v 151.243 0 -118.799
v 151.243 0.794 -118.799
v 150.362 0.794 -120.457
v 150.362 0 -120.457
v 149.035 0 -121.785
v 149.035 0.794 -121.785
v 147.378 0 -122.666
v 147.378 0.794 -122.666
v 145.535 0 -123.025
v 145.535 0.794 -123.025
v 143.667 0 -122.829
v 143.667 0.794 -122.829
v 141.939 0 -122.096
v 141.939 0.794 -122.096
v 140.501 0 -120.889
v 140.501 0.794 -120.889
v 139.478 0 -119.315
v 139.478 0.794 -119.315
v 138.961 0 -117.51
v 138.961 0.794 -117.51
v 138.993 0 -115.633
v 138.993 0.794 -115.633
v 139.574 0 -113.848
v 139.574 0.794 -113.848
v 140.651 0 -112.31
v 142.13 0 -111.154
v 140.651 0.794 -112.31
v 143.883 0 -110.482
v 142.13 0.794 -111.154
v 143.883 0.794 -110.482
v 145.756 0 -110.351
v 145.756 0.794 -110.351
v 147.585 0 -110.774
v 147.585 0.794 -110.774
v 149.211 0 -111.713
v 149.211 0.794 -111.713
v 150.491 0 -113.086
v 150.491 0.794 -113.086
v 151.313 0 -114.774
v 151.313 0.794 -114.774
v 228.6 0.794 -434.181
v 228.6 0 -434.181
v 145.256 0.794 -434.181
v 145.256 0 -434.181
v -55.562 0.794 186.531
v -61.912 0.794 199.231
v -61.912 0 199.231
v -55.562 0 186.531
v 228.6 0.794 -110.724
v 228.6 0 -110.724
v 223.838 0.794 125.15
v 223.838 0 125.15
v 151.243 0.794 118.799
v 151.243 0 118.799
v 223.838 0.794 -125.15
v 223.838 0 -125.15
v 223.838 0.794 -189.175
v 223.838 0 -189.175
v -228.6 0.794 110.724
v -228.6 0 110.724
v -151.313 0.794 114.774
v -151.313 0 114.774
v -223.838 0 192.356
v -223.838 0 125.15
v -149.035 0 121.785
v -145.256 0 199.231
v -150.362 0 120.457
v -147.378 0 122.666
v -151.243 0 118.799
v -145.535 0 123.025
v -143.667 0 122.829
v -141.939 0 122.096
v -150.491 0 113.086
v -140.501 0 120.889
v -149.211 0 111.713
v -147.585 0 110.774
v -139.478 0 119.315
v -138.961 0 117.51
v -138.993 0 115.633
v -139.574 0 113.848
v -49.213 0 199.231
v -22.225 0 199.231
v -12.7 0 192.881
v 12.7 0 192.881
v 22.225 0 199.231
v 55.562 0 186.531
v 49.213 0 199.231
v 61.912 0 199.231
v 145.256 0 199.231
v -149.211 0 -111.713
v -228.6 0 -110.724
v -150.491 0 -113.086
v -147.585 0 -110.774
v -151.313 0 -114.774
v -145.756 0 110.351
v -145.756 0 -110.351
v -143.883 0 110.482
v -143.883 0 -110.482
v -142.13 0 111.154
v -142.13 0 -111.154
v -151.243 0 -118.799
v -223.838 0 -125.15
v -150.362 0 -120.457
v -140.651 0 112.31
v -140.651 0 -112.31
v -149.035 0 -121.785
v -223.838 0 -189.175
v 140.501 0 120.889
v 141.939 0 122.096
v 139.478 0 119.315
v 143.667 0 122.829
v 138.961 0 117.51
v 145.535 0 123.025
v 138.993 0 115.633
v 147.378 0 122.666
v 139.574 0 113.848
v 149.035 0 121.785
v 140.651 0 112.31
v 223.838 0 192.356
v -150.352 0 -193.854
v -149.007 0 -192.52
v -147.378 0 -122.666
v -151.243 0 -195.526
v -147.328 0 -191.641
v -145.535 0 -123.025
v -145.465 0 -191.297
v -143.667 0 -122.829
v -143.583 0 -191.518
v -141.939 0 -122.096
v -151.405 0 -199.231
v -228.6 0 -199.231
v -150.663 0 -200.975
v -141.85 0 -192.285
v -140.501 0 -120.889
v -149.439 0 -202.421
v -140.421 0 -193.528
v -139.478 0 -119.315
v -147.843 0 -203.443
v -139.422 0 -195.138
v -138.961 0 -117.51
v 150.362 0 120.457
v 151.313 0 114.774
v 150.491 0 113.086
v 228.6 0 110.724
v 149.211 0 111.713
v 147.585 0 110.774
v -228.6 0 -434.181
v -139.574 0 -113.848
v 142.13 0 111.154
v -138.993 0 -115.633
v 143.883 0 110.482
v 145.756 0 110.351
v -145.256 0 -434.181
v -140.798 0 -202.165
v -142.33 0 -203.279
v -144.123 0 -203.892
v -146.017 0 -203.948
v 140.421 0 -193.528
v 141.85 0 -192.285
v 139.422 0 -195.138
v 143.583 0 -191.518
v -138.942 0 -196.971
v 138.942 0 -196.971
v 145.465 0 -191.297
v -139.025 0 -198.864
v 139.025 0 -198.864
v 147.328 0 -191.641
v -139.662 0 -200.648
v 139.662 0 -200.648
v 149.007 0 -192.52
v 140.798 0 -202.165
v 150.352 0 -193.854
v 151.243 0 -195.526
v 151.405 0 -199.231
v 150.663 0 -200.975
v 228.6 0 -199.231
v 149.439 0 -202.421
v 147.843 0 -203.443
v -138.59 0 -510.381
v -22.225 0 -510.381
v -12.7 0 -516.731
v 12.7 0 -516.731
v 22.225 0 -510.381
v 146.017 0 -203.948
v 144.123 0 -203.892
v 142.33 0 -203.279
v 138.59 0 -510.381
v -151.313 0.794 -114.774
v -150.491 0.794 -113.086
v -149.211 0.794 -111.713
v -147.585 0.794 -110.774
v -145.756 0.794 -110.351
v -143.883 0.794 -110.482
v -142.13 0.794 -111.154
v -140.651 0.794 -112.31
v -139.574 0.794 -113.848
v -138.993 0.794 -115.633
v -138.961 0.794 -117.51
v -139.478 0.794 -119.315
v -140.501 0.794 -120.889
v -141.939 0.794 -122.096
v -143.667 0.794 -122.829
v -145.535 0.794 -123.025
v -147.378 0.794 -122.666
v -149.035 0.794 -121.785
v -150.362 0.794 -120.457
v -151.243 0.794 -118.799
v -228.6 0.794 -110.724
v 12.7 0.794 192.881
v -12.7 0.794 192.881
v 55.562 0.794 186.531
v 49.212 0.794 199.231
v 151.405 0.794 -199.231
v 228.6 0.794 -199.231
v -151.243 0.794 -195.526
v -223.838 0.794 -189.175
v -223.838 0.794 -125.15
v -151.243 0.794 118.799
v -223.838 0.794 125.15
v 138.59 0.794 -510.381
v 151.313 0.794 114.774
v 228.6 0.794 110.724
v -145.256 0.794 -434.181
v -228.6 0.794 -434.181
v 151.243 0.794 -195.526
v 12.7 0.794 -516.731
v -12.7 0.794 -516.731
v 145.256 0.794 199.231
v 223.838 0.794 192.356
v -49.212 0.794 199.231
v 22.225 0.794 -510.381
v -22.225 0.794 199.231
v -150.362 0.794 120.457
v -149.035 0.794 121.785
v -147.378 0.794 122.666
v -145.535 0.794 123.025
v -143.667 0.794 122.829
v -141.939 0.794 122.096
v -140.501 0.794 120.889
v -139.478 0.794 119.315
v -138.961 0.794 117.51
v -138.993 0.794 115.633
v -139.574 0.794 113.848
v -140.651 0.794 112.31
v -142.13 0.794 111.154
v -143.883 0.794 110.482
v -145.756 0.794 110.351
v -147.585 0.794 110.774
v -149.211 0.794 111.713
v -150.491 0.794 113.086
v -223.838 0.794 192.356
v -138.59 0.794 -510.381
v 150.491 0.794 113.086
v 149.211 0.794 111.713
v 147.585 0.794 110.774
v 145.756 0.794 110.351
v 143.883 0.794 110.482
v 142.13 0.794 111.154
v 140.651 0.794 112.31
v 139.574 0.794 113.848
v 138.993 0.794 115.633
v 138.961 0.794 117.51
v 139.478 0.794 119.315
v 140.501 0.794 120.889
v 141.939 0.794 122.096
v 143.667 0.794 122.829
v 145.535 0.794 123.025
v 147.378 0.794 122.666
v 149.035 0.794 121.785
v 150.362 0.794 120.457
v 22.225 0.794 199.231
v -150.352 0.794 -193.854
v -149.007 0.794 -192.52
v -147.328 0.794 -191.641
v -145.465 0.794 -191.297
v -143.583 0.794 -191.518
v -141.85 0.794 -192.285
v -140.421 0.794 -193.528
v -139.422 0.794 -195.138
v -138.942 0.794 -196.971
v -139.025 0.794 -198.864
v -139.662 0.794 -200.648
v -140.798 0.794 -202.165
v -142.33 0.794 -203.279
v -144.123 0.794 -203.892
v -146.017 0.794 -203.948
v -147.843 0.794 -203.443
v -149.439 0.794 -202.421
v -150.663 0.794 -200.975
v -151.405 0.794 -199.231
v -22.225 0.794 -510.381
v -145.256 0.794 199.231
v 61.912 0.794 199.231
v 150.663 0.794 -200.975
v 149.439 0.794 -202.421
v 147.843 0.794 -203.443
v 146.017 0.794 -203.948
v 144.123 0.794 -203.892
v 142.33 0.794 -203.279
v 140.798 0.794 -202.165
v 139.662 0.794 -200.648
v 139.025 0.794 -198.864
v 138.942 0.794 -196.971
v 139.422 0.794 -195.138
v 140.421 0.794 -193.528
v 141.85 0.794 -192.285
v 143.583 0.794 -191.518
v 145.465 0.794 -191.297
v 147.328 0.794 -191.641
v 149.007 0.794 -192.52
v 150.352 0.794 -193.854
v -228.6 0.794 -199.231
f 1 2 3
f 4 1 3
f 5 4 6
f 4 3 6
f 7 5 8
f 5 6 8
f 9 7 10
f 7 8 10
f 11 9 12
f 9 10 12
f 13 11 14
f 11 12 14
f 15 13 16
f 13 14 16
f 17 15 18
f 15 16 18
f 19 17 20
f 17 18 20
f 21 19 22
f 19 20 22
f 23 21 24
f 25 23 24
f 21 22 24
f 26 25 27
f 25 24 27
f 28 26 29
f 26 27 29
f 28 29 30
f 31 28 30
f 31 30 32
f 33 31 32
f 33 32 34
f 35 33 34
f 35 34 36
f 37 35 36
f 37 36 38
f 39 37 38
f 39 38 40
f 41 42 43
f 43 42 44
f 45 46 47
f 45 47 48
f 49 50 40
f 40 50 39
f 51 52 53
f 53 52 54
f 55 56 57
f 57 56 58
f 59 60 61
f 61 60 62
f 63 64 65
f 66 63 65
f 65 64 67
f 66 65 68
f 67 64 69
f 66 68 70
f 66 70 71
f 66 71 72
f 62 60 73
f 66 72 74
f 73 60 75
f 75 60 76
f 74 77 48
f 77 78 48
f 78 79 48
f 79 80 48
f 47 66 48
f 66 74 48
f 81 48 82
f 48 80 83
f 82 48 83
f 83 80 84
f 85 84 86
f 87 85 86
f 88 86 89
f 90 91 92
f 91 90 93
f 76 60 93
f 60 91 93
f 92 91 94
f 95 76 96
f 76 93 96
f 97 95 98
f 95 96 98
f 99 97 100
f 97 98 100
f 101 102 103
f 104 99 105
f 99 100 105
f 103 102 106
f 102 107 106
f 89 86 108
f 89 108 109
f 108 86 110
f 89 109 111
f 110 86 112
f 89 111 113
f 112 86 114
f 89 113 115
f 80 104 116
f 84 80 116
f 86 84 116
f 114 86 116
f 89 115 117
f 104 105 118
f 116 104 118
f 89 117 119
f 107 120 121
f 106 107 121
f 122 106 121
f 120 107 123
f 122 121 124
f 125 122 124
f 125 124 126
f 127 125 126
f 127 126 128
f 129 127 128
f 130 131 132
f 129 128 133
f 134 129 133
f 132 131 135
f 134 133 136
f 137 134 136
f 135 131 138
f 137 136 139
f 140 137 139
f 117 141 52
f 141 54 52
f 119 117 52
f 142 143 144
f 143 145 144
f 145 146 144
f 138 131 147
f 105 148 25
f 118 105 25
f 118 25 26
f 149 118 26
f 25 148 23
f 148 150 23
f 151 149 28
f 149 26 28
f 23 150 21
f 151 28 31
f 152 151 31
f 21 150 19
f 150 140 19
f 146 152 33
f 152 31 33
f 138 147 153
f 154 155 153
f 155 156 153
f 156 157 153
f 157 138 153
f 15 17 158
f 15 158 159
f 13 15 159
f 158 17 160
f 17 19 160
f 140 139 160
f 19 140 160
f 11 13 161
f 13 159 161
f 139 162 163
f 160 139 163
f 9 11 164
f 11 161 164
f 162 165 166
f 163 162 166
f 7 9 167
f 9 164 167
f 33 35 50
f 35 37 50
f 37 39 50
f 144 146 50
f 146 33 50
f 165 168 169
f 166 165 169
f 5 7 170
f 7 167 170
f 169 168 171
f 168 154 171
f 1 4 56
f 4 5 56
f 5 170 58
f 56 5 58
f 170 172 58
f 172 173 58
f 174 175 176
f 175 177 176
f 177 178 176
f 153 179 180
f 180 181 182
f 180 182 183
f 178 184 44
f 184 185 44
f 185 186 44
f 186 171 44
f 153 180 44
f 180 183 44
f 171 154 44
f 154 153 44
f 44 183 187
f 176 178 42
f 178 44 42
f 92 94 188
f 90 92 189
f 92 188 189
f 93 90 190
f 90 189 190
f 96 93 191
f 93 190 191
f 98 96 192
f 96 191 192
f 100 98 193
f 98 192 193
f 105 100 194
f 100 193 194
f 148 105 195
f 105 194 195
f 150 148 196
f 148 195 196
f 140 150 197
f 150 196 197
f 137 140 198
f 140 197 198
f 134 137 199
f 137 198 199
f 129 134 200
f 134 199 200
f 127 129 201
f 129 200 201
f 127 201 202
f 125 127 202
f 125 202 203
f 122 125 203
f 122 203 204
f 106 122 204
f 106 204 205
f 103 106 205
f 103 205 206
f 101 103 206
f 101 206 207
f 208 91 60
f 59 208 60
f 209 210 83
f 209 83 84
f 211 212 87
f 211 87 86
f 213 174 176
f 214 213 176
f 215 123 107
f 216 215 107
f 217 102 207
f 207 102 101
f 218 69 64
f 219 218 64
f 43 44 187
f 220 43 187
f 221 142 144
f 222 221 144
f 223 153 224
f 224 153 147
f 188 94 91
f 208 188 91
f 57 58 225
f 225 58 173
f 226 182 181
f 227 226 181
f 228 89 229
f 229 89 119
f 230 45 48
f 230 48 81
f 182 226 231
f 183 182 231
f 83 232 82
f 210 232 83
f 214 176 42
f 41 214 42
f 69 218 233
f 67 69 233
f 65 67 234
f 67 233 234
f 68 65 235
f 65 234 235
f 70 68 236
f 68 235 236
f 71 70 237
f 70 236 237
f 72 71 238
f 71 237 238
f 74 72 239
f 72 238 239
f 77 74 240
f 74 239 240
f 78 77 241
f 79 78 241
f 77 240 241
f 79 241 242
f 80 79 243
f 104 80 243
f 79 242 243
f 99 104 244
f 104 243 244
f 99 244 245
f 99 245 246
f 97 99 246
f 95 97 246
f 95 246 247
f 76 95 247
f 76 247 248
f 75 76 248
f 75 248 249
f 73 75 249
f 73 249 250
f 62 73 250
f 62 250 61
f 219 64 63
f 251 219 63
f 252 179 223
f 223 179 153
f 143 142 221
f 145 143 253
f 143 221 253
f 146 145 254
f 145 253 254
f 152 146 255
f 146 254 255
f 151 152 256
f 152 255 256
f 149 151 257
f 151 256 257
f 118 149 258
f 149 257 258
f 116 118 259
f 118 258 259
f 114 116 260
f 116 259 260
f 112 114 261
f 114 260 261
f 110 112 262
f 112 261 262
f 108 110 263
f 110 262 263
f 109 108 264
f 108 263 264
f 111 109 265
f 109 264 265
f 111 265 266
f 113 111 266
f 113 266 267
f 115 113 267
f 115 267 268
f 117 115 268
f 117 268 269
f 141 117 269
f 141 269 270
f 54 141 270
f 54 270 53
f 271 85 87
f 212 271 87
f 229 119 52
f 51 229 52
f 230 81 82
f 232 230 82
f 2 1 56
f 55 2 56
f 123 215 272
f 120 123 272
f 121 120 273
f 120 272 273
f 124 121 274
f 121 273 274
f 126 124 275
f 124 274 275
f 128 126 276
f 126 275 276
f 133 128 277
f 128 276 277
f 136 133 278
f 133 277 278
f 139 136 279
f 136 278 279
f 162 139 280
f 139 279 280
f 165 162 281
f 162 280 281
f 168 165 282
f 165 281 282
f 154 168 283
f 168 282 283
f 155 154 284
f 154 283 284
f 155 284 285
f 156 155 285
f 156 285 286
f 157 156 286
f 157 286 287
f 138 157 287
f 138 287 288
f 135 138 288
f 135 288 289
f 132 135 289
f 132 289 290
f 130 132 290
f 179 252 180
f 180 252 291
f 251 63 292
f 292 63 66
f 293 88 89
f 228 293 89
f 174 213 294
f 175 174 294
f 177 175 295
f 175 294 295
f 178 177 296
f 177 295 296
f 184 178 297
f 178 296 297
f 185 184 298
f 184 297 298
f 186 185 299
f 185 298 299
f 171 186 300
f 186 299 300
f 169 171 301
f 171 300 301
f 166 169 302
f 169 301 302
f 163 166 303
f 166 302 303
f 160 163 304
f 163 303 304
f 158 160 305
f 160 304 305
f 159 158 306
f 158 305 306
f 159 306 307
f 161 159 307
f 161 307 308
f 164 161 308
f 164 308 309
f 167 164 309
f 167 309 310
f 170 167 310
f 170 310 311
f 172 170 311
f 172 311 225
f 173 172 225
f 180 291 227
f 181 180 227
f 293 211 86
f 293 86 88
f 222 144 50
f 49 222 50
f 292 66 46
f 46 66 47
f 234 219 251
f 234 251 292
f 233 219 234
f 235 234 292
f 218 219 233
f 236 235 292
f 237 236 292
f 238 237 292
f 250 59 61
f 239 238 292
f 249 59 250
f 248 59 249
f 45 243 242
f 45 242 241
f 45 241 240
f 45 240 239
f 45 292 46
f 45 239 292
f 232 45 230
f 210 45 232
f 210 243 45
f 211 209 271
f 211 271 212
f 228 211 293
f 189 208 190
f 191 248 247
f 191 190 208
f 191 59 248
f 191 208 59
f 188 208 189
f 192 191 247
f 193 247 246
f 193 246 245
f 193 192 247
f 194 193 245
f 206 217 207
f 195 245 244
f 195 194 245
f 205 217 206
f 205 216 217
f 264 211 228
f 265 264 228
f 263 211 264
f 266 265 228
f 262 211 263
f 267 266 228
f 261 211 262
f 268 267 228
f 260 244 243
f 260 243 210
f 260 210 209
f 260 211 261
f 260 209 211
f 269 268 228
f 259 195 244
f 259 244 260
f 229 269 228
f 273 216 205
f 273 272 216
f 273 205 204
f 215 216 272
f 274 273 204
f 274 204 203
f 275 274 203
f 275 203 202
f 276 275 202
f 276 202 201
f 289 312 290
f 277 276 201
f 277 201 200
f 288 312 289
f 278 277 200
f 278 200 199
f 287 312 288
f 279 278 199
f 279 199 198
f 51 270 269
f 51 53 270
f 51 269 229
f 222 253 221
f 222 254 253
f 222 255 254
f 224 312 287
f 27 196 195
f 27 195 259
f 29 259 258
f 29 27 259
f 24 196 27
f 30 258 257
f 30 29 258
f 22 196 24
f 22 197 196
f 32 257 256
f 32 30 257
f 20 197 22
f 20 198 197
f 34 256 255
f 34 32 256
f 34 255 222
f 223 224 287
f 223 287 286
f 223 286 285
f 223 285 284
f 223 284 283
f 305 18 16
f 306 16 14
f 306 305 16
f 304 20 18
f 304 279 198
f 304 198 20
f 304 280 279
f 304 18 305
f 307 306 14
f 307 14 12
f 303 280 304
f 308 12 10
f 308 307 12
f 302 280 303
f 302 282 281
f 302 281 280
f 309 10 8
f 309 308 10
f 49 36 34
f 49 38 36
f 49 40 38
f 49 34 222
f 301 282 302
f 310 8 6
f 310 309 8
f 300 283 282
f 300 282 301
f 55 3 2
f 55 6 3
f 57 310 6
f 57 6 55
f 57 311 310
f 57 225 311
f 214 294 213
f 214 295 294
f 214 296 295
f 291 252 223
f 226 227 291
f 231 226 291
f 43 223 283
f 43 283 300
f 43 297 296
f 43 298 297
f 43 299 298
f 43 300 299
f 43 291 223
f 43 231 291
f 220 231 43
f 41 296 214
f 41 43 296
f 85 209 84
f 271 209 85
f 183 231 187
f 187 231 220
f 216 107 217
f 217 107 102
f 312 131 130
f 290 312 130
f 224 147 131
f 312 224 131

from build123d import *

# Parameters (mm, degrees)
EXTRUDE1_DEPTH = 0.79375
EXTRUDE2_REACH = 2.794
SKETCH2_R      = 6.35
EXTRUDE3_REACH = 2.794
EXTRUDE4_REACH = 2.794


with BuildPart() as part:
    # Sketch1 → Extrude1 (new body)
    with BuildSketch(Plane(origin=(0, 0, 0), x_dir=(1, 0, 0), z_dir=(0, 1, 0))):
        with BuildLine():
            Line((145.25625, 434.18125), (138.034060826, 516.73125))
            Line((138.034060826, 516.73125), (-138.034060826, 516.73125))
            Line((-138.034060826, 516.73125), (-145.25625, 434.18125))
            Line((-145.25625, 434.18125), (-228.6, 434.18125))
            Line((-228.6, 434.18125), (-228.6, 199.23125))
            Line((-228.6, 199.23125), (-145.25625, 199.23125))
            ThreePointArc((-145.25625, 199.23125), (-143.670260948, 197.712995777), (-145.117890258, 196.062290917))
            Line((-145.117890258, 196.062290917), (-223.8375, 189.175217467))
            Line((-223.8375, 189.175217467), (-223.8375, 125.149782533))
            Line((-223.8375, 125.149782533), (-145.117890258, 118.262709083))
            ThreePointArc((-145.117890258, 118.262709083), (-143.668991784, 116.653544305), (-145.173166669, 115.095925614))
            Line((-145.173166669, 115.095925614), (-228.6, 110.723710546))
            Line((-228.6, 110.723710546), (-228.6, -110.723710546))
            Line((-228.6, -110.723710546), (-145.173166669, -115.095925614))
            ThreePointArc((-145.173166669, -115.095925614), (-143.668991784, -116.653544305), (-145.117890258, -118.262709083))
            Line((-145.117890258, -118.262709083), (-223.8375, -125.149782533))
            Line((-223.8375, -125.149782533), (-223.8375, -192.356281459))
            Line((-223.8375, -192.356281459), (-145.25625, -199.23125))
            Line((-145.25625, -199.23125), (145.25625, -199.23125))
            Line((145.25625, -199.23125), (223.8375, -192.356281459))
            Line((223.8375, -192.356281459), (223.8375, -125.149782533))
            Line((223.8375, -125.149782533), (145.117890258, -118.262709083))
            ThreePointArc((145.117890258, -118.262709083), (143.668991784, -116.653544305), (145.173166669, -115.095925614))
            Line((145.173166669, -115.095925614), (228.6, -110.723710546))
            Line((228.6, -110.723710546), (228.6, 110.723710546))
            Line((228.6, 110.723710546), (145.173166669, 115.095925614))
            ThreePointArc((145.173166669, 115.095925614), (143.668991784, 116.653544305), (145.117890258, 118.262709083))
            Line((145.117890258, 118.262709083), (223.8375, 125.149782533))
            Line((223.8375, 125.149782533), (223.8375, 189.175217467))
            Line((223.8375, 189.175217467), (145.117890258, 196.062290917))
            ThreePointArc((145.117890258, 196.062290917), (143.670260948, 197.712995777), (145.25625, 199.23125))
            Line((145.25625, 199.23125), (228.6, 199.23125))
            Line((228.6, 199.23125), (228.6, 434.18125))
            Line((228.6, 434.18125), (145.25625, 434.18125))
        make_face()
    extrude(amount=EXTRUDE1_DEPTH)

    # Sketch2 → Extrude2 (cut, up to next)
    with BuildSketch(Plane(origin=(0, 0.79375, 0), x_dir=(1, 0, 0), z_dir=(0, 1, 0)), mode=Mode.PRIVATE) as extrude2_sk1:
        with Locations((-145.25625, 116.68125)):
            Circle(SKETCH2_R)
    extrude2_tool1 = extrude(extrude2_sk1.sketch, amount=-EXTRUDE2_REACH, mode=Mode.PRIVATE) & part.part
    add(extrude2_tool1.solids().sort_by_distance((-145.25625, 0.79375, -116.68125))[0], mode=Mode.SUBTRACT)
    # Sketch2 → Extrude2 (cut, up to next)
    with BuildSketch(Plane(origin=(0, 0.79375, 0), x_dir=(1, 0, 0), z_dir=(0, 1, 0)), mode=Mode.PRIVATE) as extrude2_sk2:
        with Locations((-145.25625, -116.68125)):
            Circle(SKETCH2_R)
    extrude2_tool2 = extrude(extrude2_sk2.sketch, amount=-EXTRUDE2_REACH, mode=Mode.PRIVATE) & part.part
    add(extrude2_tool2.solids().sort_by_distance((-145.25625, 0.79375, 116.68125))[0], mode=Mode.SUBTRACT)
    # Sketch2 → Extrude2 (cut, up to next)
    with BuildSketch(Plane(origin=(0, 0.79375, 0), x_dir=(1, 0, 0), z_dir=(0, 1, 0)), mode=Mode.PRIVATE) as extrude2_sk3:
        with Locations((145.25625, -116.68125)):
            Circle(SKETCH2_R)
    extrude2_tool3 = extrude(extrude2_sk3.sketch, amount=-EXTRUDE2_REACH, mode=Mode.PRIVATE) & part.part
    add(extrude2_tool3.solids().sort_by_distance((145.25625, 0.79375, 116.68125))[0], mode=Mode.SUBTRACT)
    # Sketch2 → Extrude2 (cut, up to next)
    with BuildSketch(Plane(origin=(0, 0.79375, 0), x_dir=(1, 0, 0), z_dir=(0, 1, 0)), mode=Mode.PRIVATE) as extrude2_sk4:
        with Locations((145.25625, 116.68125)):
            Circle(SKETCH2_R)
    extrude2_tool4 = extrude(extrude2_sk4.sketch, amount=-EXTRUDE2_REACH, mode=Mode.PRIVATE) & part.part
    add(extrude2_tool4.solids().sort_by_distance((145.25625, 0.79375, -116.68125))[0], mode=Mode.SUBTRACT)
    # Sketch2 → Extrude2 (cut, up to next)
    with BuildSketch(Plane(origin=(0, 0.79375, 0), x_dir=(1, 0, 0), z_dir=(0, 1, 0)), mode=Mode.PRIVATE) as extrude2_sk5:
        with Locations((-145.25625, 197.64375)):
            Circle(SKETCH2_R)
    extrude2_tool5 = extrude(extrude2_sk5.sketch, amount=-EXTRUDE2_REACH, mode=Mode.PRIVATE) & part.part
    add(extrude2_tool5.solids().sort_by_distance((-145.25625, 0.79375, -197.64375))[0], mode=Mode.SUBTRACT)
    # Sketch2 → Extrude2 (cut, up to next)
    with BuildSketch(Plane(origin=(0, 0.79375, 0), x_dir=(1, 0, 0), z_dir=(0, 1, 0)), mode=Mode.PRIVATE) as extrude2_sk6:
        with Locations((145.25625, 197.64375)):
            Circle(SKETCH2_R)
    extrude2_tool6 = extrude(extrude2_sk6.sketch, amount=-EXTRUDE2_REACH, mode=Mode.PRIVATE) & part.part
    add(extrude2_tool6.solids().sort_by_distance((145.25625, 0.79375, -197.64375))[0], mode=Mode.SUBTRACT)

    # Sketch12 → Extrude3 (cut, up to next)
    with BuildSketch(Plane(origin=(0, 0.79375, 0), x_dir=(1, 0, 0), z_dir=(0, 1, 0)), mode=Mode.PRIVATE) as extrude3_sk1:
        Polygon((-138.589613839, 510.38125), (-22.225, 510.38125), (-12.7, 516.73125), (-138.034060826, 516.73125), align=None)
    extrude3_tool1 = extrude(extrude3_sk1.sketch, amount=-EXTRUDE3_REACH, mode=Mode.PRIVATE) & part.part
    add(extrude3_tool1.solids().sort_by_distance((-77.855995, 0.79375, -513.595525))[0], mode=Mode.SUBTRACT)
    # Sketch12 → Extrude3 (cut, up to next)
    with BuildSketch(Plane(origin=(0, 0.79375, 0), x_dir=(1, 0, 0), z_dir=(0, 1, 0)), mode=Mode.PRIVATE) as extrude3_sk2:
        Polygon((12.7, 516.73125), (22.225, 510.38125), (138.589613839, 510.38125), (138.034060826, 516.73125), align=None)
    extrude3_tool2 = extrude(extrude3_sk2.sketch, amount=-EXTRUDE3_REACH, mode=Mode.PRIVATE) & part.part
    add(extrude3_tool2.solids().sort_by_distance((77.855995, 0.79375, -513.595525))[0], mode=Mode.SUBTRACT)

    # Sketch13 → Extrude4 (cut, up to next)
    with BuildSketch(Plane(origin=(0, 0.79375, 0), x_dir=(1, 0, 0), z_dir=(0, 1, 0)), mode=Mode.PRIVATE) as extrude4_sk1:
        Polygon((-61.9125, -199.23125), (-55.5625, -186.53125), (-49.2125, -199.23125), align=None)
    extrude4_tool1 = extrude(extrude4_sk1.sketch, amount=-EXTRUDE4_REACH, mode=Mode.PRIVATE) & part.part
    add(extrude4_tool1.solids().sort_by_distance((-55.5625, 0.79375, 194.997917))[0], mode=Mode.SUBTRACT)
    # Sketch13 → Extrude4 (cut, up to next)
    with BuildSketch(Plane(origin=(0, 0.79375, 0), x_dir=(1, 0, 0), z_dir=(0, 1, 0)), mode=Mode.PRIVATE) as extrude4_sk2:
        Polygon((49.2125, -199.23125), (55.5625, -186.53125), (61.9125, -199.23125), align=None)
    extrude4_tool2 = extrude(extrude4_sk2.sketch, amount=-EXTRUDE4_REACH, mode=Mode.PRIVATE) & part.part
    add(extrude4_tool2.solids().sort_by_distance((55.5625, 0.79375, 194.997917))[0], mode=Mode.SUBTRACT)
    # Sketch13 → Extrude4 (cut, up to next)
    with BuildSketch(Plane(origin=(0, 0.79375, 0), x_dir=(1, 0, 0), z_dir=(0, 1, 0)), mode=Mode.PRIVATE) as extrude4_sk3:
        Polygon((-22.225, -199.23125), (-12.7, -192.88125), (12.7, -192.88125), (22.225, -199.23125), align=None)
    extrude4_tool3 = extrude(extrude4_sk3.sketch, amount=-EXTRUDE4_REACH, mode=Mode.PRIVATE) & part.part
    add(extrude4_tool3.solids().sort_by_distance((0, 0.79375, 196.344886))[0], mode=Mode.SUBTRACT)


solid = part.part
